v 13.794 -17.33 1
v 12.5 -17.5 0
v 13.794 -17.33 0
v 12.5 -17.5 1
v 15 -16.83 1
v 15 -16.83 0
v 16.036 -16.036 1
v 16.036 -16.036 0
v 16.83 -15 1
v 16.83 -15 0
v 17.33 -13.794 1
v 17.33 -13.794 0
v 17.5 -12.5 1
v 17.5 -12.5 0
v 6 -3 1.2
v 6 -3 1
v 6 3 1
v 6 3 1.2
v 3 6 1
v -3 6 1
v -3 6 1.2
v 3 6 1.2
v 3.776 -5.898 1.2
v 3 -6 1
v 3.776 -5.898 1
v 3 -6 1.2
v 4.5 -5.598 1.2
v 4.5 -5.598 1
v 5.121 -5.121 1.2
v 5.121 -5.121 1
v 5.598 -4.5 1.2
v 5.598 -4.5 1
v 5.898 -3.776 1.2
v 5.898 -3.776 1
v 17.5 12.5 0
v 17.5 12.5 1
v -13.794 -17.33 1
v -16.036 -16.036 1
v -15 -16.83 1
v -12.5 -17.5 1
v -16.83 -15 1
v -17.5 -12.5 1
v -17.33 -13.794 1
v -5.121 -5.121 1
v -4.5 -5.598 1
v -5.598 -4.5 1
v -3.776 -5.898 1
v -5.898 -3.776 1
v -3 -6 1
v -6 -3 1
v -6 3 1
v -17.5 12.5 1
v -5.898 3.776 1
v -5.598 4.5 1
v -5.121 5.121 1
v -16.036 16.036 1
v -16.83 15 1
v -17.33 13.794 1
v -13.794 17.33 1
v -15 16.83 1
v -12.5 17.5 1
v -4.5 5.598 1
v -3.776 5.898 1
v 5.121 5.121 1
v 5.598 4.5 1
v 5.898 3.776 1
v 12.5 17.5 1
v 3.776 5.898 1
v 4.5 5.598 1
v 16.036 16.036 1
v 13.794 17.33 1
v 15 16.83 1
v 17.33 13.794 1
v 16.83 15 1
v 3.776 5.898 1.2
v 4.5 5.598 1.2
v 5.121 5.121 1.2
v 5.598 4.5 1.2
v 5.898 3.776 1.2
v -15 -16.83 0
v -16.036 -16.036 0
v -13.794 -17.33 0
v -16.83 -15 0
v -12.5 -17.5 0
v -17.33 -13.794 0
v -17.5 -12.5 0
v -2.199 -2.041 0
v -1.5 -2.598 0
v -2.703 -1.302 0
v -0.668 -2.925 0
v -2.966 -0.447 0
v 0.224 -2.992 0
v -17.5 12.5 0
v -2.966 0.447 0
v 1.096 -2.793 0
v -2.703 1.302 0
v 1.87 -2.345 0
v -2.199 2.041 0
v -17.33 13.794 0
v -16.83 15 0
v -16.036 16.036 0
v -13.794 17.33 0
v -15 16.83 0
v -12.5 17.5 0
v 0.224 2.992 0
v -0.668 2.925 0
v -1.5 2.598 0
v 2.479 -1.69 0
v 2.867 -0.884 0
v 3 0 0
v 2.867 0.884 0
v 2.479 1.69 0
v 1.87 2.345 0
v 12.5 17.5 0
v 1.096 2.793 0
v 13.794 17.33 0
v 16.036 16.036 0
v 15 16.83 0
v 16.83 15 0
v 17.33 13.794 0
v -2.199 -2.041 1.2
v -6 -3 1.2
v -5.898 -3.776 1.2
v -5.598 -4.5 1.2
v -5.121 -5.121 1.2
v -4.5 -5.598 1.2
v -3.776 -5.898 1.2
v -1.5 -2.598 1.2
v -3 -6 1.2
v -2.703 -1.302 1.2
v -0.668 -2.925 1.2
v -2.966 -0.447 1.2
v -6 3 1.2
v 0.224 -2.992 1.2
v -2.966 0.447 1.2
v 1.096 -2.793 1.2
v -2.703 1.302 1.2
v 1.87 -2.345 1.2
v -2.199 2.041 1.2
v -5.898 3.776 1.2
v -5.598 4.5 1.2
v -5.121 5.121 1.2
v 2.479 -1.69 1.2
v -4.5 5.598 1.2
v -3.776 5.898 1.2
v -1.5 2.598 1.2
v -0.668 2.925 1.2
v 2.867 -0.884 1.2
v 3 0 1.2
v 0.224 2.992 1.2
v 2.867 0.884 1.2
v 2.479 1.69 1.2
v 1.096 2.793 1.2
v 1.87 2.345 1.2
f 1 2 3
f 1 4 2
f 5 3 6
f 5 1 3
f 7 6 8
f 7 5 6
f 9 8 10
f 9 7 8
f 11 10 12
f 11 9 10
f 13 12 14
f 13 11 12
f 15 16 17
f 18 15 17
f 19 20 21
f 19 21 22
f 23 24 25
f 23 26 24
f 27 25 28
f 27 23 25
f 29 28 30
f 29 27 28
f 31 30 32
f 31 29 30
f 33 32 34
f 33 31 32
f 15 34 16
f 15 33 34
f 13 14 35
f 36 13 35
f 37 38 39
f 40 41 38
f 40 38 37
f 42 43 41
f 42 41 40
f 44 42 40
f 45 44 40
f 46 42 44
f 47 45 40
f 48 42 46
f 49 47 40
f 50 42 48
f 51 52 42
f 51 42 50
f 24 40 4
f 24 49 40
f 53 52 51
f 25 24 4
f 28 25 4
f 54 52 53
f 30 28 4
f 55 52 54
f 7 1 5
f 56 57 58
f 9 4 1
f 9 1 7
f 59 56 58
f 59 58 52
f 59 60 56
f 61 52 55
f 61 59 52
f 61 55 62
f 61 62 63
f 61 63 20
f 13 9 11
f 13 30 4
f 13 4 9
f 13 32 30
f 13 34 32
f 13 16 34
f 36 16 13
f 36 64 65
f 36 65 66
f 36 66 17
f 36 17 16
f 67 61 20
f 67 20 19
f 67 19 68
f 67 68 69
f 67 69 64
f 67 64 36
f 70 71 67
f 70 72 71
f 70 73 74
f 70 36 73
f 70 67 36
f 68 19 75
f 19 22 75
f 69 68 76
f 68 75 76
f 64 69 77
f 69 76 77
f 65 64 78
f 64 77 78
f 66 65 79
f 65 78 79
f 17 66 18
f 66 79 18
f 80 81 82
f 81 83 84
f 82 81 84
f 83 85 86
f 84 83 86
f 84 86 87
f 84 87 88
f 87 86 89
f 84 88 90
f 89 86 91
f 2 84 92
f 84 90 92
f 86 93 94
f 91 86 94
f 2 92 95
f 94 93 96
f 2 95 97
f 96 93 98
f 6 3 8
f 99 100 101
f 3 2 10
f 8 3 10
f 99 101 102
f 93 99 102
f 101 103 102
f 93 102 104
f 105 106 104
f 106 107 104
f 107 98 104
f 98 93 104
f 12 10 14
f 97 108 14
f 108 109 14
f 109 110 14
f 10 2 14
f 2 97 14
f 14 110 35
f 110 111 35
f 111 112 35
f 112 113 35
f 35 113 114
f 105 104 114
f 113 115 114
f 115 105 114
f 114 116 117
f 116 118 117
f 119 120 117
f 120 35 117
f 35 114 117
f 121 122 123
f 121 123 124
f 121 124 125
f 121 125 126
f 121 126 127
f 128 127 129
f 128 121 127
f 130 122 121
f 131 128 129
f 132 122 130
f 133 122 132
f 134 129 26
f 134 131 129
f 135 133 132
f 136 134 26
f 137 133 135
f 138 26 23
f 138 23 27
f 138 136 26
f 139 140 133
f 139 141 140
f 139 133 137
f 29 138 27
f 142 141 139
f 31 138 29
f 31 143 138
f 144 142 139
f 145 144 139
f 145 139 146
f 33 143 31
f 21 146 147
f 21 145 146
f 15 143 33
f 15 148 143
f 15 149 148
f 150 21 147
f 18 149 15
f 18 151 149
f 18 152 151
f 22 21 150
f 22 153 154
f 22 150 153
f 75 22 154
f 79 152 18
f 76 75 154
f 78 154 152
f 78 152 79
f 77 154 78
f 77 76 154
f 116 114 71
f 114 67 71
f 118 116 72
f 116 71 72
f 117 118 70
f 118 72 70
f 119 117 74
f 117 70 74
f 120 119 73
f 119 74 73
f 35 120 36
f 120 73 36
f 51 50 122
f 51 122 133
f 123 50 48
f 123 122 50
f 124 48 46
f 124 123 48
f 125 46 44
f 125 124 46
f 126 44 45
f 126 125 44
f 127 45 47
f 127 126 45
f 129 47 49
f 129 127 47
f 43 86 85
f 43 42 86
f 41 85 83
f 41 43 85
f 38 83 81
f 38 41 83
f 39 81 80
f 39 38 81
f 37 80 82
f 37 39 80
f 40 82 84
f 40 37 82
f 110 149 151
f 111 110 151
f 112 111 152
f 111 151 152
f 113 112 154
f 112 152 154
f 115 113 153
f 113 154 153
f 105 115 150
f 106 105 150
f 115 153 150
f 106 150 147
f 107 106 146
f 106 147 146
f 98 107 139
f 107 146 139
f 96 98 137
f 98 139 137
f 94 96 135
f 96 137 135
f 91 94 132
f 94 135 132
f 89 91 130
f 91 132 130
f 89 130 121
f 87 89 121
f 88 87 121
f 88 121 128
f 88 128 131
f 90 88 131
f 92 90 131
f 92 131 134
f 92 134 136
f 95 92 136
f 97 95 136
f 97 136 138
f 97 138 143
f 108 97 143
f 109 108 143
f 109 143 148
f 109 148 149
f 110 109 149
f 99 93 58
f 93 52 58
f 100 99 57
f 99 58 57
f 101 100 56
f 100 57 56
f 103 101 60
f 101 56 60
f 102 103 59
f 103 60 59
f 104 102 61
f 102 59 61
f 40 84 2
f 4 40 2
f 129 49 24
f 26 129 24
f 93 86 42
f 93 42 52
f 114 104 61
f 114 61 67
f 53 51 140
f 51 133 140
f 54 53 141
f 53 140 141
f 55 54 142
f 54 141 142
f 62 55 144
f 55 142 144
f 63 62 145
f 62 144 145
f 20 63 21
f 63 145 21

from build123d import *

# Parameters (mm, degrees)
F0_W     = 35
F0_H     = 35
F0_W_2   = 12
F0_H_2   = 12
F1_DEPTH = 1
F2_DEPTH = 1.2
F3_R     = 3
F4_R     = 5
F5_R     = 3
F6_DEPTH = 25


with BuildPart() as f1:
    # F0 (on Top) → F1 (new body)
    with BuildSketch(Plane.XY):
        Rectangle(F0_W, F0_H)
        Rectangle(F0_W_2, F0_H_2, mode=Mode.SUBTRACT)
    extrude(amount=F1_DEPTH)

    # F0 (on Top) → F2 (join)
    with BuildSketch(Plane.XY):
        Rectangle(F0_W_2, F0_H_2)
    extrude(amount=F2_DEPTH)

    # F3
    f3_edges = [f1.edges().sort_by_distance(p)[0] for p in [
        (-6, -6, 1.1),
        (6, -6, 1.1),
        (6, 6, 1.1),
        (-6, 6, 1.1),
    ]]
    fillet(f3_edges, radius=F3_R)

    # F4
    f4_edges = [f1.edges().sort_by_distance(p)[0] for p in [
        (-17.5, -17.5, 0.5),
        (17.5, -17.5, 0.5),
        (17.5, 17.5, 0.5),
        (-17.5, 17.5, 0.5),
    ]]
    fillet(f4_edges, radius=F4_R)

    # F5 (on face) → F6 (cut)
    with BuildSketch(Plane.XY.offset(1.2)):
        Circle(F5_R)
    extrude(amount=-F6_DEPTH, mode=Mode.SUBTRACT)


solid = f1.part
